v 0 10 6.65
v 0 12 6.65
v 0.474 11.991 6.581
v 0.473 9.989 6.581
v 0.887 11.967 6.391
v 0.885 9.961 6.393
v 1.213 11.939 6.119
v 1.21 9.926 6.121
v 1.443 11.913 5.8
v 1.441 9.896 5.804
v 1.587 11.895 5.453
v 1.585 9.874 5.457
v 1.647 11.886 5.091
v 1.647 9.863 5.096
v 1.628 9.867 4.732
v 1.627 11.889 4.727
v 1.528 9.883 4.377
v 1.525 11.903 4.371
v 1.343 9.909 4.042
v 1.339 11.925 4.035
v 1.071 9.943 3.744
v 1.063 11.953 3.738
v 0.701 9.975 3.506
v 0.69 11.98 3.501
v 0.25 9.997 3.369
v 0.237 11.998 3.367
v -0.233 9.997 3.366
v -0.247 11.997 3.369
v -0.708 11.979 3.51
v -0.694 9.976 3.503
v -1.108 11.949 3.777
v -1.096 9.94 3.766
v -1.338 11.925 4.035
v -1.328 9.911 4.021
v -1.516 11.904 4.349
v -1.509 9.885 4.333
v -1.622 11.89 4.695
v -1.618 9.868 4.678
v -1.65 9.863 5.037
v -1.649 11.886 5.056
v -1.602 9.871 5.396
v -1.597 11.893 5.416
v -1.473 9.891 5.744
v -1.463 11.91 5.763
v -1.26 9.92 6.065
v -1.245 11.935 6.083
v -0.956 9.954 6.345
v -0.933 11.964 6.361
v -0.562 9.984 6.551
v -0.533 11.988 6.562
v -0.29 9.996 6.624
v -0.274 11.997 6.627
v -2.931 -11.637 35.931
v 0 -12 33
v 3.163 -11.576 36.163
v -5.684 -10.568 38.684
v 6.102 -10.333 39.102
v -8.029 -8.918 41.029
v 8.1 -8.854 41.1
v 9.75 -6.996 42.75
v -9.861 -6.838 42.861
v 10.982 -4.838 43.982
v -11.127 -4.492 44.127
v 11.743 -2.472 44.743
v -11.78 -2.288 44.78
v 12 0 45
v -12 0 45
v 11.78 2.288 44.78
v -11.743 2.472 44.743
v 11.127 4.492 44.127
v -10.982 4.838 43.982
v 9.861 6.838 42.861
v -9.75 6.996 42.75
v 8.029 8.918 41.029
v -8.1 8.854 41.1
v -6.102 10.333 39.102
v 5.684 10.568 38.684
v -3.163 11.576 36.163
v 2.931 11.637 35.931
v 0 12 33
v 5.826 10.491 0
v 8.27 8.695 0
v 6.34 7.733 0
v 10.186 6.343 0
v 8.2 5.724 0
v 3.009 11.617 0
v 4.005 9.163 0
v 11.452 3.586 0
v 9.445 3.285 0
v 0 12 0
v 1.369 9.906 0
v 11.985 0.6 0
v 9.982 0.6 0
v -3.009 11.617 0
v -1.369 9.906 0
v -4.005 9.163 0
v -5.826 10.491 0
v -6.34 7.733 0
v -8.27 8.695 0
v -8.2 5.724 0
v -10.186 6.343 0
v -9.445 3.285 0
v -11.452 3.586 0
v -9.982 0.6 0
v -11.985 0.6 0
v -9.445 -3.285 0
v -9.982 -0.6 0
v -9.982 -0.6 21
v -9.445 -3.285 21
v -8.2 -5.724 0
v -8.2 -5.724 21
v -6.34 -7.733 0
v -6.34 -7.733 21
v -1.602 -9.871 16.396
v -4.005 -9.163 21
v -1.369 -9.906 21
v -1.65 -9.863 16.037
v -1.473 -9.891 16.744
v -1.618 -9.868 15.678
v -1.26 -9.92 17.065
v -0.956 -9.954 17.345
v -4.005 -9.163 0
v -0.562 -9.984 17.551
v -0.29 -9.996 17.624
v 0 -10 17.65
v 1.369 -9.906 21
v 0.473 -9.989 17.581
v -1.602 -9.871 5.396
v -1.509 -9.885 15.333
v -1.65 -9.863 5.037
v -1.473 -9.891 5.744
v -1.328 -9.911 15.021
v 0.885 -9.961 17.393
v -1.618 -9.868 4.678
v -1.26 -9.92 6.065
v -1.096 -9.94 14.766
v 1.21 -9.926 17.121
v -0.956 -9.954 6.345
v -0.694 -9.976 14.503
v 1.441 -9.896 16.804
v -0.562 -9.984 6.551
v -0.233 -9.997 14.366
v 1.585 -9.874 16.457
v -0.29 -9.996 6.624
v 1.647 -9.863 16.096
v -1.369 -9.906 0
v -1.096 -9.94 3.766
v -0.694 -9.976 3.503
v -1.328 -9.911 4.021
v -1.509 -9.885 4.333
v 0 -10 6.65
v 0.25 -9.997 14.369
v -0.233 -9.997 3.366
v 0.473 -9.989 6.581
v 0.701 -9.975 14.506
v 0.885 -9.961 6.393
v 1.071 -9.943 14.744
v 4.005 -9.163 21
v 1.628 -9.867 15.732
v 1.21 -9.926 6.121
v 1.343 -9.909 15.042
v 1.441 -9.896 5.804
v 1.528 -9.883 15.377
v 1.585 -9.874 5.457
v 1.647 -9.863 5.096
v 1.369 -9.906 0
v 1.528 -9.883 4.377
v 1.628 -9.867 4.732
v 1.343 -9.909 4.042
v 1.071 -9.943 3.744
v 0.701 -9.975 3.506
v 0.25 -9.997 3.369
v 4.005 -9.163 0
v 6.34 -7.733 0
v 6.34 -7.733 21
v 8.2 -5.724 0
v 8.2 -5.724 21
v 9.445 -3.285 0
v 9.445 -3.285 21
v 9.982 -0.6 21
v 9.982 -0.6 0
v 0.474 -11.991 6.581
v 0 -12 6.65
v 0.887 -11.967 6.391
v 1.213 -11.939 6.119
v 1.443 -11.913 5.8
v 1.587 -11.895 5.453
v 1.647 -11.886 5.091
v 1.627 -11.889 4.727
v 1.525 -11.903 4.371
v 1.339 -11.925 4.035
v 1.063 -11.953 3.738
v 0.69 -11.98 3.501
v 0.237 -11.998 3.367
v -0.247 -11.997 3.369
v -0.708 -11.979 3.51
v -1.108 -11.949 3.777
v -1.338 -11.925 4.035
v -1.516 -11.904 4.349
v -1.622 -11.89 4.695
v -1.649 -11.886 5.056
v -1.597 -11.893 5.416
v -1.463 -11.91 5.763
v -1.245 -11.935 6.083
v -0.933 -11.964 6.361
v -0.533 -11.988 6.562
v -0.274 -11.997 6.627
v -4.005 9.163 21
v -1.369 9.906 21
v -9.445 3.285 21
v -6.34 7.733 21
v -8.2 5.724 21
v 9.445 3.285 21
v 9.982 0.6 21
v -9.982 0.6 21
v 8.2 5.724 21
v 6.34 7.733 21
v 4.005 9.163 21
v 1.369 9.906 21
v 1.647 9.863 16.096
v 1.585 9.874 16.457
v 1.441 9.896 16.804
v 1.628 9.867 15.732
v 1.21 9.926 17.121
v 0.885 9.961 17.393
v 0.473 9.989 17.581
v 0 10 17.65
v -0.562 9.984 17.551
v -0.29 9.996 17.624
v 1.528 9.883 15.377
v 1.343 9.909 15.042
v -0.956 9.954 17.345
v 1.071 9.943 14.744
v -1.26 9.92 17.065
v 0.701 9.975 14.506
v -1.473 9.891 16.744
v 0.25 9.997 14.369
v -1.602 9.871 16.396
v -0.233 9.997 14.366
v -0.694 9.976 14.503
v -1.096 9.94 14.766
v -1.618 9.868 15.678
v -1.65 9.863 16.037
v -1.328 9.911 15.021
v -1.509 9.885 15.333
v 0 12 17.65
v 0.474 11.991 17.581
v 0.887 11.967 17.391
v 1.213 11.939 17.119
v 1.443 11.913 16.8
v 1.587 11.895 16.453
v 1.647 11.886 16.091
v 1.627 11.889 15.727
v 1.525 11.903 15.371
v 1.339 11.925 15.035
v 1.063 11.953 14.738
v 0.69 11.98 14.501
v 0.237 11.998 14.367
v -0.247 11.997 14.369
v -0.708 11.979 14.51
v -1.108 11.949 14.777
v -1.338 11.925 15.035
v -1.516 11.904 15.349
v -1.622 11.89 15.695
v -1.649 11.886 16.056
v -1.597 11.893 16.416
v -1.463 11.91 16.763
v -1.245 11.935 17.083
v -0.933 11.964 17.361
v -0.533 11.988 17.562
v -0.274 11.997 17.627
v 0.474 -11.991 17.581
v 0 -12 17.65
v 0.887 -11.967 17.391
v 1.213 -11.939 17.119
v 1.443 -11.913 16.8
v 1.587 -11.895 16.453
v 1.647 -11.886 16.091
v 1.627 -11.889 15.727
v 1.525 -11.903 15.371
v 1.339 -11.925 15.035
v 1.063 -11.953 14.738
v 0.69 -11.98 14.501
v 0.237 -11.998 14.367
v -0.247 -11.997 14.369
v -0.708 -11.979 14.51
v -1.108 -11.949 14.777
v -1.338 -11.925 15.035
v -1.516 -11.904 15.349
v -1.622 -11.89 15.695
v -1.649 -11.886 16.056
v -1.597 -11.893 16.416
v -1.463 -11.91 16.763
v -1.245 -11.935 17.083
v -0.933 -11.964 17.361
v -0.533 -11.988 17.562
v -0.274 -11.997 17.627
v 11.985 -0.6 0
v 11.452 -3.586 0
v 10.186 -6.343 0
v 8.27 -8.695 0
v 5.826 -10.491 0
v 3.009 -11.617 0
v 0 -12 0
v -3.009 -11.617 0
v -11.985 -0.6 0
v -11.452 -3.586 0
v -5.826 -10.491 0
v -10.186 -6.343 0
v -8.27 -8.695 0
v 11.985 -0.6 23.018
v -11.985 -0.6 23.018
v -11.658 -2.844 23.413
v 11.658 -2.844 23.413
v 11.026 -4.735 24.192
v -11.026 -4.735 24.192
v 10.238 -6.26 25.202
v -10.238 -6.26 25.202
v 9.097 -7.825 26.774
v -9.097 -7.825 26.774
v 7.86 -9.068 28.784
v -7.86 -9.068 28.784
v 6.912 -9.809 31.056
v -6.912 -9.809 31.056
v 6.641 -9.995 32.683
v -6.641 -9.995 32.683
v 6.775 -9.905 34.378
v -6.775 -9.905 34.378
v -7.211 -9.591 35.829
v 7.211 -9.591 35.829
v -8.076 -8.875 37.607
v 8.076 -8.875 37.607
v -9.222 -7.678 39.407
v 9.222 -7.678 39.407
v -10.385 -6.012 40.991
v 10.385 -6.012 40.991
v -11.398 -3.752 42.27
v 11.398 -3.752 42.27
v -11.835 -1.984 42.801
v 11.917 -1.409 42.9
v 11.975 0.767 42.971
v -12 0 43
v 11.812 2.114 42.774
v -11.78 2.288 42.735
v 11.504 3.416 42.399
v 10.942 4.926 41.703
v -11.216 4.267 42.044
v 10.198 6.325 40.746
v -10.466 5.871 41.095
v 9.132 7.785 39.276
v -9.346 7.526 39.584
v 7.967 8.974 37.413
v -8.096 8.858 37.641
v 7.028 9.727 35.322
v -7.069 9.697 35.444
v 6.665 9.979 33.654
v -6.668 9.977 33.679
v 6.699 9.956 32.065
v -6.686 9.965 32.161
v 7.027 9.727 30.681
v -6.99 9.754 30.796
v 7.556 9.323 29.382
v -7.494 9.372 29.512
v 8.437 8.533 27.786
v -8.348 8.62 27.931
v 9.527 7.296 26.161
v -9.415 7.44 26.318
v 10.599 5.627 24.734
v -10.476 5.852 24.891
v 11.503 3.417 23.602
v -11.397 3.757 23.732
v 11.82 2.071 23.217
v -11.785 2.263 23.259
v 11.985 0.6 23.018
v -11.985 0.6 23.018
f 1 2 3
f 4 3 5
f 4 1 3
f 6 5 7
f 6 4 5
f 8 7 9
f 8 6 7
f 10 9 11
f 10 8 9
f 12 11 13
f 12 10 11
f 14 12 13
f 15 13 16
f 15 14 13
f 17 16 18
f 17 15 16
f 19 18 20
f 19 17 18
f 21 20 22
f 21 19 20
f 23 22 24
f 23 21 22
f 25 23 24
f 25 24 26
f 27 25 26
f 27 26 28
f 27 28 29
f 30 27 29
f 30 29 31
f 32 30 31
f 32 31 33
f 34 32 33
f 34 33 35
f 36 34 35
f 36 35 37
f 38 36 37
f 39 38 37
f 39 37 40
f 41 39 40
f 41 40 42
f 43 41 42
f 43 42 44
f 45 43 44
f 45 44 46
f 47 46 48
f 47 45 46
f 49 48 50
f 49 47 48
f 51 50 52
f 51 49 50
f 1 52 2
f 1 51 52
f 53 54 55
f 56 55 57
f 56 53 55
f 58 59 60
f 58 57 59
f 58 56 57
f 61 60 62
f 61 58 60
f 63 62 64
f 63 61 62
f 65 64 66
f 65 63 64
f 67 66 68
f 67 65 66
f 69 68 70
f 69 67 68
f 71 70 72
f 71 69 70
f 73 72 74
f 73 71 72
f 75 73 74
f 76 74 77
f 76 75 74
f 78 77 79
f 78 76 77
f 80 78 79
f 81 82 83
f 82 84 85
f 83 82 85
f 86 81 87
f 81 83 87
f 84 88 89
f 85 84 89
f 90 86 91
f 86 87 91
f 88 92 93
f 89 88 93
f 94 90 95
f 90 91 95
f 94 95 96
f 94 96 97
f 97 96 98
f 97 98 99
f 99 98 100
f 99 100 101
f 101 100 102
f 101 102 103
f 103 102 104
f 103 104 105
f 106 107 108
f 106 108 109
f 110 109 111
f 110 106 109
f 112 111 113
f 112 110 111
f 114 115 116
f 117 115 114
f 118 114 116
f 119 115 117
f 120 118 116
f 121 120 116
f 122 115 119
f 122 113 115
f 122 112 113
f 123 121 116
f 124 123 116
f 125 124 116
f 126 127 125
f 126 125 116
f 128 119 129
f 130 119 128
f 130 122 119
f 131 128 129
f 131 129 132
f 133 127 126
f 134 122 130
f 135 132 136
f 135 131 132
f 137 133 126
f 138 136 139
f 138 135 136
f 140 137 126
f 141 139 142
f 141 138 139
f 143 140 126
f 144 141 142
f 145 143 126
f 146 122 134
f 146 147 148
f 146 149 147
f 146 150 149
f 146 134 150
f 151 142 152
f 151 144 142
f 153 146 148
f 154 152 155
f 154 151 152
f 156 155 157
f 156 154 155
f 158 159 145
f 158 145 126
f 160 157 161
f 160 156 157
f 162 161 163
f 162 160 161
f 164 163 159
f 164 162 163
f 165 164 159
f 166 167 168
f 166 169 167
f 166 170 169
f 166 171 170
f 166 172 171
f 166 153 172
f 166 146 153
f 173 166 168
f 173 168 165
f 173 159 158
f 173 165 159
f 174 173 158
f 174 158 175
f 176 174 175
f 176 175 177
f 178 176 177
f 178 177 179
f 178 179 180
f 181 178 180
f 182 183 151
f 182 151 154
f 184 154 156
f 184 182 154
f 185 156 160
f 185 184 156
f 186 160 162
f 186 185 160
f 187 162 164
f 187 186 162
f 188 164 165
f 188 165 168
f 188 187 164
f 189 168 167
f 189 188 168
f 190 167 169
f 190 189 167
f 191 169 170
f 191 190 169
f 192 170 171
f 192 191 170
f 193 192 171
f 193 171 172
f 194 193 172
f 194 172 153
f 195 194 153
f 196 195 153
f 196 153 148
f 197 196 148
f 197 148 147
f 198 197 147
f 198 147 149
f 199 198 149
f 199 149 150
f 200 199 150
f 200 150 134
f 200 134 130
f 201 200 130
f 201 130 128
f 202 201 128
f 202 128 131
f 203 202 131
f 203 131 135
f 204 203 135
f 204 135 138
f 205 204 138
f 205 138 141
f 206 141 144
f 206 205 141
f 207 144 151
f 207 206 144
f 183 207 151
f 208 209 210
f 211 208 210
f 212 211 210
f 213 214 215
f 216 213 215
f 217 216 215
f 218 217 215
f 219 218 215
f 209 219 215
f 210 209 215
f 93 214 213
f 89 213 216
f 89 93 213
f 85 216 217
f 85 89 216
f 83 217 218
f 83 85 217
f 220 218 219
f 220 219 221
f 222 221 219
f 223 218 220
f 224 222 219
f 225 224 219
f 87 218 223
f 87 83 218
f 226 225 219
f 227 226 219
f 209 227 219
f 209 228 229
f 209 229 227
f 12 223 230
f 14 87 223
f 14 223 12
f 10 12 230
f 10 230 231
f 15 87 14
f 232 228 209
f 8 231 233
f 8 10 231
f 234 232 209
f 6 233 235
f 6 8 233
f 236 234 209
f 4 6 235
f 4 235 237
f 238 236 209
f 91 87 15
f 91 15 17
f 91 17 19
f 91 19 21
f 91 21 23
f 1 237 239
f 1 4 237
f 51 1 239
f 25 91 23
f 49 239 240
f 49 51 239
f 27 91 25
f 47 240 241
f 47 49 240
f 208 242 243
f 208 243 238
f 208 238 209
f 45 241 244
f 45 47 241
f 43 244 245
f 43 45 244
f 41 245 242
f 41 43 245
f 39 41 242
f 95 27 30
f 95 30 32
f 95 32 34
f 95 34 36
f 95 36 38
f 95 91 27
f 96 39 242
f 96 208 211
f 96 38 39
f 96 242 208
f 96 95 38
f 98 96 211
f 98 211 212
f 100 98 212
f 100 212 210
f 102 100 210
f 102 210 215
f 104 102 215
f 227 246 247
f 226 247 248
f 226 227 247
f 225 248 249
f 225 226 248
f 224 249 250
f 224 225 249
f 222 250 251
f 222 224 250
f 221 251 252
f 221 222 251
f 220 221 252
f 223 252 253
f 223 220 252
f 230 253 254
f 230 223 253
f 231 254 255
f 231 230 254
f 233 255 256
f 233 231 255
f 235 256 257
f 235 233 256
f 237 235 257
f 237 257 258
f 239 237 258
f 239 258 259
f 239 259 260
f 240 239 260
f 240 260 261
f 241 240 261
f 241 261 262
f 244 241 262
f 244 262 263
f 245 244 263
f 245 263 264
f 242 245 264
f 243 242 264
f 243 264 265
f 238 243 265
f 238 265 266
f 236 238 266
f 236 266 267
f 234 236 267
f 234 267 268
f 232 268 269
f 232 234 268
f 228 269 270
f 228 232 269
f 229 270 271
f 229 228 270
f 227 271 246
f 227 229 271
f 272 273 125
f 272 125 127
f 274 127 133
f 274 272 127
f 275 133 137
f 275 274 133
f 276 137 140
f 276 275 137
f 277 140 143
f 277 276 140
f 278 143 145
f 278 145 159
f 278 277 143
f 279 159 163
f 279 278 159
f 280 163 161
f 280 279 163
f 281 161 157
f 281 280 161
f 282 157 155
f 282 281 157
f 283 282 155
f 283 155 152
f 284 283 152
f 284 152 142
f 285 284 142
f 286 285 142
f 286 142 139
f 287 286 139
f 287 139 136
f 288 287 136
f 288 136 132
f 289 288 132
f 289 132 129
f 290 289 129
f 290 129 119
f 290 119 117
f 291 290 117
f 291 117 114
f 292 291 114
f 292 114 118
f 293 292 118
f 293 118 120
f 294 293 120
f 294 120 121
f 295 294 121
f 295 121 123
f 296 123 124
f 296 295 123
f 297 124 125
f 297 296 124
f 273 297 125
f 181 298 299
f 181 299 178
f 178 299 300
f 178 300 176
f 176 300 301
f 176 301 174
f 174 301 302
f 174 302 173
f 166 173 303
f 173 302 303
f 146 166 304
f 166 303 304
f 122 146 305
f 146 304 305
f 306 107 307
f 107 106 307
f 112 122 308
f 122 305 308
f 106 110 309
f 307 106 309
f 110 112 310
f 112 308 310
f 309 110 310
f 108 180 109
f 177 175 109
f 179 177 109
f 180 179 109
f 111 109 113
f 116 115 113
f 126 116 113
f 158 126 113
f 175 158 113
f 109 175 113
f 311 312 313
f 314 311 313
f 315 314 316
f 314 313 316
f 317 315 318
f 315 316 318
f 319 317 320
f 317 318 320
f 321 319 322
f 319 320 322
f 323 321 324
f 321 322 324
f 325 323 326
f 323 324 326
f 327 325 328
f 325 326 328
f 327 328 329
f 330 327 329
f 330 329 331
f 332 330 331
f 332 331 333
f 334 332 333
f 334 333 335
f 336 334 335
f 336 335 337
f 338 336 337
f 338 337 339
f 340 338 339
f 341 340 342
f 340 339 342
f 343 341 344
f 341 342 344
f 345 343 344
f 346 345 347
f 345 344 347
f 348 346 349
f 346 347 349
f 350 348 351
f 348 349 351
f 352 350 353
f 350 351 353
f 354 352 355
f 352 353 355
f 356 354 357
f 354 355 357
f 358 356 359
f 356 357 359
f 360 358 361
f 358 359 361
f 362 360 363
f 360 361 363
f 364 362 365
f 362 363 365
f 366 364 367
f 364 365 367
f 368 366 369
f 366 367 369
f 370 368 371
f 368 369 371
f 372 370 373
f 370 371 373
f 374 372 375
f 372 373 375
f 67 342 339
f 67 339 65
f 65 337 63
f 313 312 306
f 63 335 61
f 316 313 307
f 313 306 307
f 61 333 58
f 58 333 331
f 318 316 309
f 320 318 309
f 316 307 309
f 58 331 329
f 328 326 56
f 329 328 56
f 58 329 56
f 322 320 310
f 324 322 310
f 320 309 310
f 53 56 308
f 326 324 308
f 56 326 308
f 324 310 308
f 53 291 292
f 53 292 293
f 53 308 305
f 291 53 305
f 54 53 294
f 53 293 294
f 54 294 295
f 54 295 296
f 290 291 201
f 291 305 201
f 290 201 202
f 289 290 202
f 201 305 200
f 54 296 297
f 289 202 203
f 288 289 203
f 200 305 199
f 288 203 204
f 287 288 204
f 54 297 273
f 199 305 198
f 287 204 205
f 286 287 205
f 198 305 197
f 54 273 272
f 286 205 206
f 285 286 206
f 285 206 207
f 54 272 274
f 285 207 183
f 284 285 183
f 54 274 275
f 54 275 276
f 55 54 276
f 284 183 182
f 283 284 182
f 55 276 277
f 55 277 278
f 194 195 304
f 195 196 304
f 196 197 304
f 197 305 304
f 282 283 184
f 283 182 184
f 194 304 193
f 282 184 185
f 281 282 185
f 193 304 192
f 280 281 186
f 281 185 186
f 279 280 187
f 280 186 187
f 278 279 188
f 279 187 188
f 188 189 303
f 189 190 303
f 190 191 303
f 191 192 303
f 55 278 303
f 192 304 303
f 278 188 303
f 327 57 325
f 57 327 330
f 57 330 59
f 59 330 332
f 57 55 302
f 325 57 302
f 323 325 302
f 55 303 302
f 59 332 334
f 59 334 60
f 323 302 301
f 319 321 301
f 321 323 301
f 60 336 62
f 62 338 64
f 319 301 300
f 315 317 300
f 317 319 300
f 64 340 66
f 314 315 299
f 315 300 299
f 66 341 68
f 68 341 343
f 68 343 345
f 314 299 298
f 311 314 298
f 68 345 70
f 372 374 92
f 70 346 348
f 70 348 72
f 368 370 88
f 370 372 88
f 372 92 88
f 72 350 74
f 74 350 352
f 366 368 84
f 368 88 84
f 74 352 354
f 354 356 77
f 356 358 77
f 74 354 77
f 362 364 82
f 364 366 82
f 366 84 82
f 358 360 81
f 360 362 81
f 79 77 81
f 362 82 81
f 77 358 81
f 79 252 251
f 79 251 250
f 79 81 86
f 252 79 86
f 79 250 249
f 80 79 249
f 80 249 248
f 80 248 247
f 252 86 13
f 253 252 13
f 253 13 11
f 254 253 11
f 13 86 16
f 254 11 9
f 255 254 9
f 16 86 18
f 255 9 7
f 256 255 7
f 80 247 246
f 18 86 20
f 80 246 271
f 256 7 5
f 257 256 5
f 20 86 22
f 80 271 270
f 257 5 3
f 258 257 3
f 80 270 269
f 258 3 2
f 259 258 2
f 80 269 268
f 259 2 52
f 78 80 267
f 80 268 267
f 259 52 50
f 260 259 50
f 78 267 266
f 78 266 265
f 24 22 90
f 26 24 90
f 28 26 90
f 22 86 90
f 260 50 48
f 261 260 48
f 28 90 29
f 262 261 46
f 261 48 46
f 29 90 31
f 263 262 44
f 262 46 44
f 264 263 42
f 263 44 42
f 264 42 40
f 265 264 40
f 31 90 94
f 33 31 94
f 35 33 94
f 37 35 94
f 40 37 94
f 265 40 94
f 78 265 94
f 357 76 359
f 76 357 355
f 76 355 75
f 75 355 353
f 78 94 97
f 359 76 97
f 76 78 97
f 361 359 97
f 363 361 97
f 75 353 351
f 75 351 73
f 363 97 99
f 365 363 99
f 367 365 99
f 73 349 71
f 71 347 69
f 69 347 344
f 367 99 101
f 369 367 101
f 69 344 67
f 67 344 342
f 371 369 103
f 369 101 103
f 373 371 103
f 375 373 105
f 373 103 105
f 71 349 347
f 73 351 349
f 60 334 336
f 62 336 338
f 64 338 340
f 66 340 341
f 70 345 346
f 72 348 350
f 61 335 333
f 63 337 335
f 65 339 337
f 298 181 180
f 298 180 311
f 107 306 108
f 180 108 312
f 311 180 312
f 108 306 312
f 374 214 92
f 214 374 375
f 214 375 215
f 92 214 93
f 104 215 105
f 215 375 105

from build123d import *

# Parameters (mm, degrees)
ESQUISSE1_R                  = 12
ESQUISSE1_R_2                = 10
BOSS_EXTRU_1_DEPTH           = 21
ESQUISSE2_R                  = 12
BOSS_EXTRU_2_DEPTH           = 24
ENL_V_MAT_EXTRU_1_DEPTH      = 49.093658626
ENL_V_MAT_EXTRU_1_DEPTH_BACK = 49.093658626
ENL_V_MAT_EXTRU_2_DEPTH      = 49.246865329
ENL_V_MAT_EXTRU_2_DEPTH_BACK = 49.246865329
ESQUISSE4_R                  = 1.65


with BuildPart() as part:
    # Esquisse1 → Boss.-Extru.1 (new body)
    with BuildSketch(Plane.XY):
        with Locations(Location((0, 0, 0), (0, 0, 180))):
            Circle(ESQUISSE1_R)
        with Locations(Location((0, 0, 0), (0, 0, 180))):
            Circle(ESQUISSE1_R_2, mode=Mode.SUBTRACT)
    extrude(amount=BOSS_EXTRU_1_DEPTH)

    # Esquisse2 → Boss.-Extru.2 (add)
    with BuildSketch(Plane.XY.offset(21)):
        with Locations(Location((0, 0, 0), (0, 0, 180))):
            Circle(ESQUISSE2_R)
    extrude(amount=BOSS_EXTRU_2_DEPTH)

    # Esquisse3 → Enlèv. mat.-Extru.1 (cut, two sides: drawn at the far end of the back side and taken through both)
    with BuildSketch(Plane(origin=(0, 0, 0), x_dir=(0, 0, -1), z_dir=(1, 0, 0)).offset(-ENL_V_MAT_EXTRU_1_DEPTH_BACK)):
        with BuildLine():
            Line((-33, 12), (-45, 12))
            Line((-45, 12), (-50, 0))
            Line((-50, 0), (-45, -12))
            Line((-45, -12), (-33, -12))
            ThreePointArc((-33, -12), (-45, 0), (-33, 12))
        make_face()
        with BuildLine():
            Line((-23.018016229, 0.6), (0, 0.6))
            Line((0, 0.6), (0, -0.6))
            Line((0, -0.6), (-23.018016229, -0.6))
            ThreePointArc((-23.018016229, -0.6), (-43, 0), (-23.018016229, 0.6))
        make_face()
    extrude(amount=ENL_V_MAT_EXTRU_1_DEPTH + ENL_V_MAT_EXTRU_1_DEPTH_BACK, mode=Mode.SUBTRACT)

    # Esquisse4 → Enlèv. mat.-Extru.2 (cut, two sides: drawn at the far end of the back side and taken through both)
    with BuildSketch(Plane(origin=(0, -0.6, 0), x_dir=(1, 0, 0), z_dir=(0, 1, 0)).offset(-ENL_V_MAT_EXTRU_2_DEPTH_BACK)):
        with Locations(Location((0, -16, 0), (0, 0, 270))):
            Circle(ESQUISSE4_R)
        with Locations(Location((0, -5, 0), (0, 0, 270))):
            Circle(ESQUISSE4_R)
    extrude(amount=ENL_V_MAT_EXTRU_2_DEPTH + ENL_V_MAT_EXTRU_2_DEPTH_BACK, mode=Mode.SUBTRACT)


solid = part.part
